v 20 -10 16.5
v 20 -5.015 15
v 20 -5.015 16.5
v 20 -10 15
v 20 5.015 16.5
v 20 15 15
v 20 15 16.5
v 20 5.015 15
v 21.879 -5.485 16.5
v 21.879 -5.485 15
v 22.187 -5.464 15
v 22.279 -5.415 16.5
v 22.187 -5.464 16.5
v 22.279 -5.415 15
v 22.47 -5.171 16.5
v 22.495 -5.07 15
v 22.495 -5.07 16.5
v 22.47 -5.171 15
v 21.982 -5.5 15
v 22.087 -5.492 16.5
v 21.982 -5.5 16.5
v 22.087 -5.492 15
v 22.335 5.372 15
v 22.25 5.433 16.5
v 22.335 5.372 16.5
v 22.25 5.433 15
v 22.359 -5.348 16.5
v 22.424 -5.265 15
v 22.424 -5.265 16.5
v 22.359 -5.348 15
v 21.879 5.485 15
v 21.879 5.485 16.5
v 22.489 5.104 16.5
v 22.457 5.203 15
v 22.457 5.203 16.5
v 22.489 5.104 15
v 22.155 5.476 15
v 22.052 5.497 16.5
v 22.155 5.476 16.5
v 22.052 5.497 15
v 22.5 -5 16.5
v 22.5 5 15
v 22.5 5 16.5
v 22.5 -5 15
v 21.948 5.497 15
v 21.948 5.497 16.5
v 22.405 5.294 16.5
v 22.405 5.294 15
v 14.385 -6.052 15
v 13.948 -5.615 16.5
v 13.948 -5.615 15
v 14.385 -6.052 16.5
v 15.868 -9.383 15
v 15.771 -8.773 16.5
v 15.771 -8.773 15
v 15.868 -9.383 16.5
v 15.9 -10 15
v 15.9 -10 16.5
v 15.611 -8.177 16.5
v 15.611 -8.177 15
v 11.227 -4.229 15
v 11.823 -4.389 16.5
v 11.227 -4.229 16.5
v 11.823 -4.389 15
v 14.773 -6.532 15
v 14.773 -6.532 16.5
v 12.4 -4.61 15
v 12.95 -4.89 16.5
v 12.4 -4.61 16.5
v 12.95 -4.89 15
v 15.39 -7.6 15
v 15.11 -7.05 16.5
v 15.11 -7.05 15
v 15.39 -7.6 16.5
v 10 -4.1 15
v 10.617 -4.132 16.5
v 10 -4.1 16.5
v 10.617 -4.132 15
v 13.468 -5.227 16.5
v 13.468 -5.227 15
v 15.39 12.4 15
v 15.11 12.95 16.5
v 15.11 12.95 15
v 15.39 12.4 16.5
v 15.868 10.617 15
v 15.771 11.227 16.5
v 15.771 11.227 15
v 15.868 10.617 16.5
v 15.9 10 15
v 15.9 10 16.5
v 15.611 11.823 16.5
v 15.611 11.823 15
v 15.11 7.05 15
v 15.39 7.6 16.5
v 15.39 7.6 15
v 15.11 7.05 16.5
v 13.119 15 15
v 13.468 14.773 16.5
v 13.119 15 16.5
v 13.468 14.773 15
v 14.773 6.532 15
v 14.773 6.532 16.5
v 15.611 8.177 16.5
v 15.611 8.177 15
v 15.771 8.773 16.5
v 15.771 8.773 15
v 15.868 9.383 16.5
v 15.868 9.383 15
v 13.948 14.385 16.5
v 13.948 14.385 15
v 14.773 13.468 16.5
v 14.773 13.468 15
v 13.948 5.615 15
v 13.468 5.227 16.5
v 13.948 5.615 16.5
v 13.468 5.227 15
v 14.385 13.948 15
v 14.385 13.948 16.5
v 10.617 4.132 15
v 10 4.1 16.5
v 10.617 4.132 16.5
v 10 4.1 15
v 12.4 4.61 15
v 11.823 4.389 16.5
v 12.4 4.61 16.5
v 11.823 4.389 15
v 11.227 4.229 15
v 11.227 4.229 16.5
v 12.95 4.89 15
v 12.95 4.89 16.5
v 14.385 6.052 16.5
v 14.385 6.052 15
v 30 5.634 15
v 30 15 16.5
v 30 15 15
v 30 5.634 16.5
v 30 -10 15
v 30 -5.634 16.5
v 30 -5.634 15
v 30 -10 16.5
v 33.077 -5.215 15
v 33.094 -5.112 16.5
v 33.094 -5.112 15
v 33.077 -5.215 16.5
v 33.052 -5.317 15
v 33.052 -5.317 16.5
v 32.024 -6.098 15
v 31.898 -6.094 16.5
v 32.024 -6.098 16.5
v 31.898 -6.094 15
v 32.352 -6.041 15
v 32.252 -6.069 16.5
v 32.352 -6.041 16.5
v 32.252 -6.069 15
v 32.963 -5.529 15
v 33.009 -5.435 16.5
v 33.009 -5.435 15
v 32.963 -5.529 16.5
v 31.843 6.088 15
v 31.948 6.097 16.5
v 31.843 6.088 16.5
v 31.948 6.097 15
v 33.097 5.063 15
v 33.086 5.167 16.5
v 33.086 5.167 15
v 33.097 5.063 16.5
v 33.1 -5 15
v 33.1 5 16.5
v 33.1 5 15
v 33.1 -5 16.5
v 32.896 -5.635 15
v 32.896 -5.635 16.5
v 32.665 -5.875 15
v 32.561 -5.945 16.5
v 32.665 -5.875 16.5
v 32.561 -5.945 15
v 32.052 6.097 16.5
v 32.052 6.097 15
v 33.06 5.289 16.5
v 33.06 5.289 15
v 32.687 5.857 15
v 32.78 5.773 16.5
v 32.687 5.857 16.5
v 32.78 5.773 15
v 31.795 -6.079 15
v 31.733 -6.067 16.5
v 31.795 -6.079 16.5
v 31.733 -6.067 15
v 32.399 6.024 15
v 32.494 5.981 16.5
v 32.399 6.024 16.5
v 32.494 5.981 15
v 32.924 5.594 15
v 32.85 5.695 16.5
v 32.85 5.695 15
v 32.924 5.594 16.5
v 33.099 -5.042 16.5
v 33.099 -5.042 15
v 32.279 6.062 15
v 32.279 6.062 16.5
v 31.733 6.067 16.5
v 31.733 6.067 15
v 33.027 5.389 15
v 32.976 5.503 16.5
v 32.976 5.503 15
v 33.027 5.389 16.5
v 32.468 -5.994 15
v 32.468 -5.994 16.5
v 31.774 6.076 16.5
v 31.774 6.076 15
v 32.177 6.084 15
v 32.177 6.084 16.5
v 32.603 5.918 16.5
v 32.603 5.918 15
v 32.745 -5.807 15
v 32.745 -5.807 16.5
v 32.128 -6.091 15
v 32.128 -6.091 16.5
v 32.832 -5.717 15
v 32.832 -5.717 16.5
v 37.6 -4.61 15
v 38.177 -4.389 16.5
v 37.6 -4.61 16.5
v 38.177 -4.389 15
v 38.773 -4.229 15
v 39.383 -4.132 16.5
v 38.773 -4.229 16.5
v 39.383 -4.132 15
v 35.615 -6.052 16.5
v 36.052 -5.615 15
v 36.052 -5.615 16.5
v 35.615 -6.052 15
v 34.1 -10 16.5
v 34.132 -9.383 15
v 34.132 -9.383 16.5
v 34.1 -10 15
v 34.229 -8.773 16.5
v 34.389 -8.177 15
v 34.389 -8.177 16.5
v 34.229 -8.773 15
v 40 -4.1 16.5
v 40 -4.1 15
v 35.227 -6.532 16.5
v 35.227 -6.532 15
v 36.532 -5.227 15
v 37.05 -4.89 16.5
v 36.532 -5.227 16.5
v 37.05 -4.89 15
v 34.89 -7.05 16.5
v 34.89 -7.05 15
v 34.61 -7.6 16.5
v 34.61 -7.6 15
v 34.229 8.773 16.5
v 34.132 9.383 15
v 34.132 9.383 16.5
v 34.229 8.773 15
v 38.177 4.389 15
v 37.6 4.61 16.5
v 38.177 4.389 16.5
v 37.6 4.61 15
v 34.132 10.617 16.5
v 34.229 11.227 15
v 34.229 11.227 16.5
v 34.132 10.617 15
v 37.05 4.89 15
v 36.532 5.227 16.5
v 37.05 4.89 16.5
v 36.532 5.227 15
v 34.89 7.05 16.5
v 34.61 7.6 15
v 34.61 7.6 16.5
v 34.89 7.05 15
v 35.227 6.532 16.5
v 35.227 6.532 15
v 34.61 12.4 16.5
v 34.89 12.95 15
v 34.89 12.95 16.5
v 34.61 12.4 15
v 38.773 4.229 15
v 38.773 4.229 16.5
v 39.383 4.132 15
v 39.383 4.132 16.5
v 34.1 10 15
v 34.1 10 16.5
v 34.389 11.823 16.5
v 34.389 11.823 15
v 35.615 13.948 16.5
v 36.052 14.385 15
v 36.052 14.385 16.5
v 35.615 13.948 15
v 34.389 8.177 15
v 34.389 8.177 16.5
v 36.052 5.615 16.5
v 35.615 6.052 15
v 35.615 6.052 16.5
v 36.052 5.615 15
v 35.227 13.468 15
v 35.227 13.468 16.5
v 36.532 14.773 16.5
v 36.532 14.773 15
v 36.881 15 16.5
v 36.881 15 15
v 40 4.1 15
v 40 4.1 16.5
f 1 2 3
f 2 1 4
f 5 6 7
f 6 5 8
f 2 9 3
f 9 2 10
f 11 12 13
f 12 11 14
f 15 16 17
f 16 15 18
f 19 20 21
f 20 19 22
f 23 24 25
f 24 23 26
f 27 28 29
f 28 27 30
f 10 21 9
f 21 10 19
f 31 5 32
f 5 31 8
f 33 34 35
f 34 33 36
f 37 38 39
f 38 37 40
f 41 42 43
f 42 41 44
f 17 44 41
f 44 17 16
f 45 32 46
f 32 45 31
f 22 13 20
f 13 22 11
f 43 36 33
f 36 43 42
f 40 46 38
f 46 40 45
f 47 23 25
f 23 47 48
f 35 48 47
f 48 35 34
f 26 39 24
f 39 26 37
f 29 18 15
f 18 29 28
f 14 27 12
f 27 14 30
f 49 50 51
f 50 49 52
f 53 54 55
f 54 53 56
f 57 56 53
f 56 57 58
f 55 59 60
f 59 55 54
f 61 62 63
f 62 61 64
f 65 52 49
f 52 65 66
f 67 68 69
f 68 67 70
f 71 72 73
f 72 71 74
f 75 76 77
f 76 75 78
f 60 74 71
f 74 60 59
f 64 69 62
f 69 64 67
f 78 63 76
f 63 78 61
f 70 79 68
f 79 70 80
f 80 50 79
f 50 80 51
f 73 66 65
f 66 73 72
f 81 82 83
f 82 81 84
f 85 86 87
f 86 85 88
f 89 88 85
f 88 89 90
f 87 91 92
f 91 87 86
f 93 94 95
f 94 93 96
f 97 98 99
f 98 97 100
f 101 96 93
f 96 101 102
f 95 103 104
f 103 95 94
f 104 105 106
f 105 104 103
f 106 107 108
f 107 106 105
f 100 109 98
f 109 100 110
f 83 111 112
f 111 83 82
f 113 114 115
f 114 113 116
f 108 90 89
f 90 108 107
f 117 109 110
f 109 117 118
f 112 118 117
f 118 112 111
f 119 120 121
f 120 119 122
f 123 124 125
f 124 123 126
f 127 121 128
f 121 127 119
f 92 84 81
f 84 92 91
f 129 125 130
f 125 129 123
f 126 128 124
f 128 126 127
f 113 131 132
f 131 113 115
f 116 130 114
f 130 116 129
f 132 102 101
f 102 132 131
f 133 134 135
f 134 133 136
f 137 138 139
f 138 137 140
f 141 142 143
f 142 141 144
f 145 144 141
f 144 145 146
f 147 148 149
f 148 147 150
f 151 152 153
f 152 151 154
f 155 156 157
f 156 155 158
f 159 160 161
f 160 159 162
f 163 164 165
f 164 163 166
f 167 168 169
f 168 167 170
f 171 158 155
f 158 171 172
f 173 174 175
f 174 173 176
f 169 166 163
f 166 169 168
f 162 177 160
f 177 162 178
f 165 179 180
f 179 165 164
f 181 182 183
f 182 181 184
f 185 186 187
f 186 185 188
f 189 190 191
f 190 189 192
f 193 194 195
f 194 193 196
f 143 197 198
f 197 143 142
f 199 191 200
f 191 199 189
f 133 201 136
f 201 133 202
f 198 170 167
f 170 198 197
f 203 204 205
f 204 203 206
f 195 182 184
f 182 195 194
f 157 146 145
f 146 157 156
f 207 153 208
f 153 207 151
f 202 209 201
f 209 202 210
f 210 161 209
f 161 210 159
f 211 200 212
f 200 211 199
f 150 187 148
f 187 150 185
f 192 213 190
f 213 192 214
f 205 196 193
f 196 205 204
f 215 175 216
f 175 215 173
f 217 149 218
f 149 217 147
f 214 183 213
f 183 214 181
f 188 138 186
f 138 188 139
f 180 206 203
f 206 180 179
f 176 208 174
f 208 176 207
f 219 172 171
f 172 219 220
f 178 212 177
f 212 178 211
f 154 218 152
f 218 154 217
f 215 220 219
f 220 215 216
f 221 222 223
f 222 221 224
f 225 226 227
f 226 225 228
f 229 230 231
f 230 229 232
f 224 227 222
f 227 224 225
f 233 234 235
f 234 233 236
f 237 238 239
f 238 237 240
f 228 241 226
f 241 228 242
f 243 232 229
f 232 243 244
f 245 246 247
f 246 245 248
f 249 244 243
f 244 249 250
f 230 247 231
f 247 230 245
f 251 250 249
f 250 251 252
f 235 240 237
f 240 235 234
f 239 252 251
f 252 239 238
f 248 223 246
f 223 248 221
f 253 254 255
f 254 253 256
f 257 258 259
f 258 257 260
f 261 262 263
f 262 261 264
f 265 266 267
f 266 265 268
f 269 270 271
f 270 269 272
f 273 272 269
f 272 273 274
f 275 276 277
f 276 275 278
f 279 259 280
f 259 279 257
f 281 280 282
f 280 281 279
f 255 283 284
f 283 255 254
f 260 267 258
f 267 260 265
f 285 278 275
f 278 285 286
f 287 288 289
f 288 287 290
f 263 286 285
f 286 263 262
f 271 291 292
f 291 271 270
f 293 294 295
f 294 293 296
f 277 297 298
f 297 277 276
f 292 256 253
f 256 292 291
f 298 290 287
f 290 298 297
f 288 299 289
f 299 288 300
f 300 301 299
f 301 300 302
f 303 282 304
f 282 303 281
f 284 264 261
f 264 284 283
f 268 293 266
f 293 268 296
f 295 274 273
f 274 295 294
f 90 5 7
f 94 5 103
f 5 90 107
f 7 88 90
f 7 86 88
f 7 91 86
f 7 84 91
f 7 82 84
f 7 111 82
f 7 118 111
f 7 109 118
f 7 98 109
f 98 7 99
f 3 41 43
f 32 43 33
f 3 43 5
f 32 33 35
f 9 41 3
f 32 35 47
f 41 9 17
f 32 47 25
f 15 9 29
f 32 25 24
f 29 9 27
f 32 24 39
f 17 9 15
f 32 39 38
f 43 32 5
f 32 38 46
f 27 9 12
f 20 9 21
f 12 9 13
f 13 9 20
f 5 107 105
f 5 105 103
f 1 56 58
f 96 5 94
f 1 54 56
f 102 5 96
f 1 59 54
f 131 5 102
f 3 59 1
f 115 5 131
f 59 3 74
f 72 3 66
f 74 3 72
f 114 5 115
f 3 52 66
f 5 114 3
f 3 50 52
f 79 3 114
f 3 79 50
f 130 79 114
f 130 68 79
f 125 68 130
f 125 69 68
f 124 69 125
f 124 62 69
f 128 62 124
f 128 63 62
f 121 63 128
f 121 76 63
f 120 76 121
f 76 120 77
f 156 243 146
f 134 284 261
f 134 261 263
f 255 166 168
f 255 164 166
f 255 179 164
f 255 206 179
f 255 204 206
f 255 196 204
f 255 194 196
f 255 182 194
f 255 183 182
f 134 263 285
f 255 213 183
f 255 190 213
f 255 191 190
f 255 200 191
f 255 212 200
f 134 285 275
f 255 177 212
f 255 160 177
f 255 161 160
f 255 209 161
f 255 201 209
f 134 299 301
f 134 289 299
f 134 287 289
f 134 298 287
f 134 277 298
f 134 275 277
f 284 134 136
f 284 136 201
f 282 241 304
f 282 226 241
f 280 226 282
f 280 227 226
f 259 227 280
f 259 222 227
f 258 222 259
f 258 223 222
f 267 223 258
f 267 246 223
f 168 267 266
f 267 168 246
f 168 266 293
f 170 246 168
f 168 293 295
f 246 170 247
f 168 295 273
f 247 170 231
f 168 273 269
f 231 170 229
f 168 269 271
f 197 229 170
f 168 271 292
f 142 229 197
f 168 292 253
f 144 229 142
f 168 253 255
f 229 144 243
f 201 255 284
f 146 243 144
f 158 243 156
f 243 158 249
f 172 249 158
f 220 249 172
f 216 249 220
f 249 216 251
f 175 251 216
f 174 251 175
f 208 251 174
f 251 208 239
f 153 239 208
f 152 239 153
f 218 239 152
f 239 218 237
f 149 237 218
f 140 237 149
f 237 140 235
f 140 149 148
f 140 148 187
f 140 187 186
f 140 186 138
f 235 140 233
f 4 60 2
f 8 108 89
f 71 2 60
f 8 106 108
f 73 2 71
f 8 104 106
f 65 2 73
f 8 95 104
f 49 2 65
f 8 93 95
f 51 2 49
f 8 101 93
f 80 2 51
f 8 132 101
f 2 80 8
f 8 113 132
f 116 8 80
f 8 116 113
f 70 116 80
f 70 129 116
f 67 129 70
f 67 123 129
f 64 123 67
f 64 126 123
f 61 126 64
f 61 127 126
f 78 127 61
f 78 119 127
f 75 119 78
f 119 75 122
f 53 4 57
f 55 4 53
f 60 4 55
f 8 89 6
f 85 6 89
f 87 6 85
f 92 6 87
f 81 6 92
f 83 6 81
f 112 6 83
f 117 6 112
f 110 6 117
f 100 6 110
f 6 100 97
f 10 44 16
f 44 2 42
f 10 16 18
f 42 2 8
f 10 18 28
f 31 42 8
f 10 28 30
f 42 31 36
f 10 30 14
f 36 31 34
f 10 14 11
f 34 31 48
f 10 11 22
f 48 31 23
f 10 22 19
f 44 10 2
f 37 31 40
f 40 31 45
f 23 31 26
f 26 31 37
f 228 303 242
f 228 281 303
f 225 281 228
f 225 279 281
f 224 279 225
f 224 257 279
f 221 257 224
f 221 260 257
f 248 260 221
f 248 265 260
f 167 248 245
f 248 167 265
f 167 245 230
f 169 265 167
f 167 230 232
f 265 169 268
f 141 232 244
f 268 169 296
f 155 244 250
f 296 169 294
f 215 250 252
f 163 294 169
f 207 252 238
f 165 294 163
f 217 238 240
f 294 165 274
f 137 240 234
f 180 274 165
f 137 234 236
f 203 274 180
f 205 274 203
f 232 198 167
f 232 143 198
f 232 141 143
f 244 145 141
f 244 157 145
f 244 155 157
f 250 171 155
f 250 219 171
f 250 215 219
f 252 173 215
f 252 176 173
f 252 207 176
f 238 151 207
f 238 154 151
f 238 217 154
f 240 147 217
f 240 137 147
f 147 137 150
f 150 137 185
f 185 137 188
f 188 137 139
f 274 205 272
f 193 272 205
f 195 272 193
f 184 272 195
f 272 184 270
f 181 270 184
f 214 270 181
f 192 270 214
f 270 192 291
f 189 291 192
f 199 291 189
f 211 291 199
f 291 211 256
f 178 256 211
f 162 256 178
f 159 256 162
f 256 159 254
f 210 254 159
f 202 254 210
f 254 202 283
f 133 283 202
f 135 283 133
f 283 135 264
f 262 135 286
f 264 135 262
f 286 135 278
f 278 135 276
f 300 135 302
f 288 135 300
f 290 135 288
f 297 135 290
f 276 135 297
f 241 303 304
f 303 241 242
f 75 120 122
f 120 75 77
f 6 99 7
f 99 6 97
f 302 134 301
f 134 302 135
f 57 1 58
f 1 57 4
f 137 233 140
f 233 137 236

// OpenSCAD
  include <./MCAD/boxes.scad>
X_MAIN = 40;
Y_MAIN = 40;

Z_MAIN = 34;
Z_BAS_TENON = 3;
D_EPP_REEL = 10.7;
COMPENSATION_IMPRIMANTE = 0.8 ;
D_EPP = D_EPP_REEL + COMPENSATION_IMPRIMANTE + 0.3 ; // Diamètre pour Eppendorf.

DIA_TROU_BAS_REEL = 3 ;
DIA_TROU_BAS = DIA_TROU_BAS_REEL+ COMPENSATION_IMPRIMANTE ; 


SPACE = 0.6 + 0; // bethween 2 parts (friction free zone). 
EPS =  0.01; 

module mortaise(){
    linear_extrude(Z_MAIN - Z_BAS_TENON +EPS) 2d_mortaise();
};

module 2d_mortaise(){
    offset(SPACE) 2d_tenon(); 
};

module 2d_tenon(){
    offset(0.5, $fn= 30) polygon(points = [[0.5, 0], [0, 2], [10, 2], [9.5, 0]]);  
};

module tenon(){
        linear_extrude(Z_MAIN - Z_BAS_TENON) 2d_tenon();
};

DEL = -2;


module tenon_biseau(){
                        // tenon 2 avec un biseau en bas
                    union(){
                        difference(){
                          translate([20, 5, -(Z_MAIN/2 - Z_BAS_TENON)]) rotate(-90) 
                               tenon();     
                          translate([20,-7, -(Z_MAIN/2-Z_BAS_TENON)])
                               chamfert();  // biseau
                        };
                    };
                };     

module body(){
      //translate([0, 0, Z_MAIN /2])
    translate([0, 0, Z_MAIN/2])
    difference(){
        // union ci-dessoud contient : boîte + 2 tenons
        union(){
                    roundedBox([X_MAIN, Y_MAIN, Z_MAIN], 3, $fn= 16, true);
                    // tenon 1 avec un biseau en bas
                       rotate(90) tenon_biseau();
                    
                    // tenon 2 avec un biseau en bas
                       tenon_biseau();
                       
        } // end of union
               
        // placement des 2 mortaises       
       translate([-5, -20 +2 +DEL, -(Z_MAIN/2 - Z_BAS_TENON)])
            mortaise();
       translate([-20 , 5 , -(Z_MAIN/2 - Z_BAS_TENON)])
            rotate(-90) mortaise(); 
    };
};

module chamfert(){
   rotate([0,25,0]) cube([10, 20,10]);
}
module box(){
    difference(){  
      body();
      // holes for tubes
      for (i =[  - 1, 0 ]) for (j = [-1, 1]) {
          translate([10 + 20 * i, 10 * j, 2 ]) 
                cylinder(h = Z_MAIN, d = D_EPP, $fn= 60);
          translate([10 + 20 * i, 10 * j, -2 ]) 
                cylinder(h= 10, d = DIA_TROU_BAS, $fn = 30);
      };  
    };
};

module make_a_slice() {
    intersection(){
        children();
        translate([-30, -30, +15]) cube([100, 100, 1.5]);
    }
} ;

// Faire une slice
// make_a_slice() box();



// Faire une découpe pour connexion
intersection(){
    
    make_a_slice() {
        box(); 
        color("yellow",  0.9) translate([50, 0]) box();
        };
    translate([10,-10])cube([30,25,40]); 
    }



// faire un slice de 2 emboitements : 
//make_a_slice() {
//    box(); 
//    color("yellow",  0.9) translate([40, 0]) box();
//    };
    
    
//color("yellow",  0.9) translate([40, 0]) make_a_slice();

// Tester l'emboitement
//box();

// %color("yellow",  0.9) translate([40, 0])box();
//2d_tenon();
//2d_mortaise();
  
//  tenon_biseau();
